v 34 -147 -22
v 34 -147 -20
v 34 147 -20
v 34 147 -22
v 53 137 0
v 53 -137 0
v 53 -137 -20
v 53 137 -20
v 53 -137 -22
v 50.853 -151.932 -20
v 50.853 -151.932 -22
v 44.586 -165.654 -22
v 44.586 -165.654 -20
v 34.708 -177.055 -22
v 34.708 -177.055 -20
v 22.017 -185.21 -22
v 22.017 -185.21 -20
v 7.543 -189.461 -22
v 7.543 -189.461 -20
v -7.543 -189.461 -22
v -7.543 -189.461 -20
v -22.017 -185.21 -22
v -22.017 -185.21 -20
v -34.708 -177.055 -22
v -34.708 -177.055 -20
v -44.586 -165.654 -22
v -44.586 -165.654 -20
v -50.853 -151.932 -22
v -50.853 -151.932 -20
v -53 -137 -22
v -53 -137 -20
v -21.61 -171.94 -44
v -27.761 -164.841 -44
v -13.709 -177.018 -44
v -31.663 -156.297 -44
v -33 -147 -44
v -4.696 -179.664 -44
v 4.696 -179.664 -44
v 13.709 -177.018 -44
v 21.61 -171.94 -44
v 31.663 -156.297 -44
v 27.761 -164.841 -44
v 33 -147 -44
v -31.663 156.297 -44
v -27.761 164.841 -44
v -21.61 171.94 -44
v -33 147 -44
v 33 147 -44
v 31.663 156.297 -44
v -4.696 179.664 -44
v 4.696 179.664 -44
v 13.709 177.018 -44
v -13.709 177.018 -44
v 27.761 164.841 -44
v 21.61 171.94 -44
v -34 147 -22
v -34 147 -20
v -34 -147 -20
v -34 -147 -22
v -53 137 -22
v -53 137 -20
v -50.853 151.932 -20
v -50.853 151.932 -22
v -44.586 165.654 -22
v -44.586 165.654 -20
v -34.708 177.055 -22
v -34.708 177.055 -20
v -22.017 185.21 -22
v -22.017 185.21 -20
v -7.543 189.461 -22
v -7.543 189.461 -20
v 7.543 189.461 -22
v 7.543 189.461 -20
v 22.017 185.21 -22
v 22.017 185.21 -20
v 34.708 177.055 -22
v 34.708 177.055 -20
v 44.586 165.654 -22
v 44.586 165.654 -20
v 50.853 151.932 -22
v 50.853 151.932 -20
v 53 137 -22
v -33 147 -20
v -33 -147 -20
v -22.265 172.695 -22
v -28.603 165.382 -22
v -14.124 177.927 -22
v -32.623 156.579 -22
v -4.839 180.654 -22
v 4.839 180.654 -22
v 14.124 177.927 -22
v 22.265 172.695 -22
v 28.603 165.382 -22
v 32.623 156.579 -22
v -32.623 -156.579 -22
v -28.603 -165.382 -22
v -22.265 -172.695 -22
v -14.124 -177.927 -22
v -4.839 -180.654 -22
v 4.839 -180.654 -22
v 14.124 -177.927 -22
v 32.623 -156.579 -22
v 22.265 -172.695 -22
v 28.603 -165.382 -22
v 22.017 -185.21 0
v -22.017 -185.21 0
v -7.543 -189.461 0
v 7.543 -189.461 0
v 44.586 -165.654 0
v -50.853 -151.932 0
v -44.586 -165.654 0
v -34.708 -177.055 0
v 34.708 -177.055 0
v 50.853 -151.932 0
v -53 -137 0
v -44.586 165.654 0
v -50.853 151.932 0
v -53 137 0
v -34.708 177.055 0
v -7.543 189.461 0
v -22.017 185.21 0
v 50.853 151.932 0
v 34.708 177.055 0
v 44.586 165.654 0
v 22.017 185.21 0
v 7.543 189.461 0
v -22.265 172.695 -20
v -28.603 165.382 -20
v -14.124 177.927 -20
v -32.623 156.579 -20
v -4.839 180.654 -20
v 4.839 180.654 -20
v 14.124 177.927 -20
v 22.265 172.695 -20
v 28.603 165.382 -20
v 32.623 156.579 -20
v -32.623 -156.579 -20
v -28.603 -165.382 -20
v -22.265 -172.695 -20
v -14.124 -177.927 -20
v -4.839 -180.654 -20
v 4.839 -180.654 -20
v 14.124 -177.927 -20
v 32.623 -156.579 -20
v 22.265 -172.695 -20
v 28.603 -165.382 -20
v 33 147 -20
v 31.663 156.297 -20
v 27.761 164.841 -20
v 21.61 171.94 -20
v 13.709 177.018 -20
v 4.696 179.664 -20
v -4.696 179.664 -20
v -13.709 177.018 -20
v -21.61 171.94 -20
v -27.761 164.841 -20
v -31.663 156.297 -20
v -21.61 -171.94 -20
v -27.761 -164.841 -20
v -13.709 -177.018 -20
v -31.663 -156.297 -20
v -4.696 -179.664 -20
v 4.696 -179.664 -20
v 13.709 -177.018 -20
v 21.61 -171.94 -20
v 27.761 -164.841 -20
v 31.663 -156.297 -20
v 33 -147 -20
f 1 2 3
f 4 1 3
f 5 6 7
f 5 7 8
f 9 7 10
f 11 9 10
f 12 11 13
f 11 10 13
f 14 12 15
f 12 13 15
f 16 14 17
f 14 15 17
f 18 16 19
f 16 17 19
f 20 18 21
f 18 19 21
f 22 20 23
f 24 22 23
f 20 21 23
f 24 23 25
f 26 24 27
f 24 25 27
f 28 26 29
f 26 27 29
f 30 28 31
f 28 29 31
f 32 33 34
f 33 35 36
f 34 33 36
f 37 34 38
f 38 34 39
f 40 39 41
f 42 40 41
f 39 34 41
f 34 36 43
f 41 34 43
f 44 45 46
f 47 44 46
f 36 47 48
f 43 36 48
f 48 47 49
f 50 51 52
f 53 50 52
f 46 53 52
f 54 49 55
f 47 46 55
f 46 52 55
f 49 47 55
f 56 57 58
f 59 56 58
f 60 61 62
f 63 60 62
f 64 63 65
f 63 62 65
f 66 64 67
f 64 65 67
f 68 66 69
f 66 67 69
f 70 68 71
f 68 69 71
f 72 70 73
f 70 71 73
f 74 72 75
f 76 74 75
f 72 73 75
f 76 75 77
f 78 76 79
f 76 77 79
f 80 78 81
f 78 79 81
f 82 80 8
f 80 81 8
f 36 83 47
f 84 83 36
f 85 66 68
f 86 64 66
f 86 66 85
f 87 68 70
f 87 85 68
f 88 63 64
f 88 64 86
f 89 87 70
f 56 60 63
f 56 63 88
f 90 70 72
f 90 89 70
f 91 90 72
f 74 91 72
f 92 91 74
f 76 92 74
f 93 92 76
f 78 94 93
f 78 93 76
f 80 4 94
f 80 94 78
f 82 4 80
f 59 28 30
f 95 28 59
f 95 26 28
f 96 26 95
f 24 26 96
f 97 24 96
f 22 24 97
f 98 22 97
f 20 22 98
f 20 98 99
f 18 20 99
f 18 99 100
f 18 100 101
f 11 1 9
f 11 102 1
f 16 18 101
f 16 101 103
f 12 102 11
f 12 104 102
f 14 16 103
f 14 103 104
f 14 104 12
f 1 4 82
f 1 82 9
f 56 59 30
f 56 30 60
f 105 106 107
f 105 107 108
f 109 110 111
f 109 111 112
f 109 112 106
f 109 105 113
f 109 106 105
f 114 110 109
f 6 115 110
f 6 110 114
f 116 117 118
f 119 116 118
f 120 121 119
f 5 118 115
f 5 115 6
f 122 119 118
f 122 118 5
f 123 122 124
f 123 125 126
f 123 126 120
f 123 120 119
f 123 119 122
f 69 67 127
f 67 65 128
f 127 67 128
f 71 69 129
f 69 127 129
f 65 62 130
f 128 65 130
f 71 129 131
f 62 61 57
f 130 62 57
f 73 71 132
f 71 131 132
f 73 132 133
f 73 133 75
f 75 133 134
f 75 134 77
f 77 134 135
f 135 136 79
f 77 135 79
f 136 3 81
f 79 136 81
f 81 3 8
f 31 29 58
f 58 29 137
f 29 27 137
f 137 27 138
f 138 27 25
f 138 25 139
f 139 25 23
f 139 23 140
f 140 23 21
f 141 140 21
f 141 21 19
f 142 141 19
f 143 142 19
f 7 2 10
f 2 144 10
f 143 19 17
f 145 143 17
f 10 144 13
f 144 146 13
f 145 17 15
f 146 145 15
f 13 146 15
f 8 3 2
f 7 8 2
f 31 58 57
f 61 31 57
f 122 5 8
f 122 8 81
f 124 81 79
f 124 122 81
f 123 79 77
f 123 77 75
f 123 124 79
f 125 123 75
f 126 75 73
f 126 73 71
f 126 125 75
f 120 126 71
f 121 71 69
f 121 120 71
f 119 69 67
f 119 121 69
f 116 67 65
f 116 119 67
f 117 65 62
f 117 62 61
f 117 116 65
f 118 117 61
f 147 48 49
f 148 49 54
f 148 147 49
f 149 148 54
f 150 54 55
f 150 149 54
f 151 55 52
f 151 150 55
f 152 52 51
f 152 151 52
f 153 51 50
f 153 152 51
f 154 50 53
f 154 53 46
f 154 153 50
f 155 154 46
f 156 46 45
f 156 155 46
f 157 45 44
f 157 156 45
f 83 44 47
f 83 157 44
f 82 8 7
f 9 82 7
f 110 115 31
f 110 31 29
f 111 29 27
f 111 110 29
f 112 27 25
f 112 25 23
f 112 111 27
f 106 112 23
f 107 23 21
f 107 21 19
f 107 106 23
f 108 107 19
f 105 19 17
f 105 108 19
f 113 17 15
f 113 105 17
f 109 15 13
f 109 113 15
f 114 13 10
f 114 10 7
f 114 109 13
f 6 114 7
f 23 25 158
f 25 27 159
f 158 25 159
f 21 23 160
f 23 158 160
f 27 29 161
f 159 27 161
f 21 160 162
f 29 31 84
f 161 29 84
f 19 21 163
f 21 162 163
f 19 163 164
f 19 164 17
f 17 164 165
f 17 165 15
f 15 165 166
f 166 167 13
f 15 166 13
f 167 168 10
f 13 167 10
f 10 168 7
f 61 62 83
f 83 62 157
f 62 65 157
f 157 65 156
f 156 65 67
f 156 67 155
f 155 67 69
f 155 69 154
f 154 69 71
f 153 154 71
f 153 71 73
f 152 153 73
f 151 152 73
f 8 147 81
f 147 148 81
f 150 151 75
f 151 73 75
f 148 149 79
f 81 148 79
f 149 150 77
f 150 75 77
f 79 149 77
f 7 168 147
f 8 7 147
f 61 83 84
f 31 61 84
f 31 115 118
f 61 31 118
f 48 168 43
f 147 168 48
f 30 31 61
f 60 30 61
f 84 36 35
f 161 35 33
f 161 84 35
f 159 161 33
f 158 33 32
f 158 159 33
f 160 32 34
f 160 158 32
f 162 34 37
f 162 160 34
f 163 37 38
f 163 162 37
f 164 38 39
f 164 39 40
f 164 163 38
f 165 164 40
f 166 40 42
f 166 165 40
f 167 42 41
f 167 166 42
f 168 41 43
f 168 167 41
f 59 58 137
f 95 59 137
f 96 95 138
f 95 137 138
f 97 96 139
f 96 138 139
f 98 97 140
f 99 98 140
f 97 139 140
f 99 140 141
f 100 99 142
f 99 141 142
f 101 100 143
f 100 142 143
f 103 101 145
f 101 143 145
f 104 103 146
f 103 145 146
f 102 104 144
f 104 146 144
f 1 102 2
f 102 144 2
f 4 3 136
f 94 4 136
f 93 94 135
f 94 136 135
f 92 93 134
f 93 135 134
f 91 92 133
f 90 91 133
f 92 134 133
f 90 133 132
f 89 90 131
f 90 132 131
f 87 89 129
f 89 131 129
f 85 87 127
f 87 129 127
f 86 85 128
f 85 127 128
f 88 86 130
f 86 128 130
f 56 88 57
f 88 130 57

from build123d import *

# Parameters (mm, degrees)
F0_W     = 66
F0_H     = 274
F0_H_2   = 10
F1_DEPTH = 44
F0_W_2   = 20
F2_DEPTH = 20
F4_DEPTH = 2


with BuildPart() as f1:
    # F0 (on Top) → F1 (new body)
    with BuildSketch(Plane.XY):
        Rectangle(F0_W, F0_H)
        with Locations((0, 142)):
            Rectangle(F0_W, F0_H_2)
        with BuildLine():
            Line((-33, 147), (33, 147))
            ThreePointArc((33, 147), (0, 180), (-33, 147))
        make_face()
        with Locations((0, -142)):
            Rectangle(F0_W, F0_H_2)
        with BuildLine():
            ThreePointArc((-33, -147), (0, -180), (33, -147))
            Line((33, -147), (-33, -147))
        make_face()
    extrude(amount=-F1_DEPTH)

    # F0 (on Top) → F2 (join)
    with BuildSketch(Plane.XY):
        with Locations((-43, 0)):
            Rectangle(F0_W_2, F0_H)
        with BuildLine():
            ThreePointArc((-33, 147), (0, 180), (33, 147))
            Line((33, 147), (33, 137))
            Line((33, 137), (53, 137))
            ThreePointArc((53, 137), (0, 190), (-53, 137))
            Line((-53, 137), (-33, 137))
            Line((-33, 137), (-33, 147))
        make_face()
        with Locations((43, 0)):
            Rectangle(F0_W_2, F0_H)
        with BuildLine():
            Line((53, -137), (33, -137))
            Line((33, -137), (33, -147))
            ThreePointArc((33, -147), (0, -180), (-33, -147))
            Line((-33, -147), (-33, -137))
            Line((-33, -137), (-53, -137))
            ThreePointArc((-53, -137), (0, -190), (53, -137))
        make_face()
    extrude(amount=-F2_DEPTH)


with BuildPart() as f4:
    # F3 (on face) → F4 (new body)
    with BuildSketch(Plane(origin=(0, 0, -20), x_dir=(1, 0, 0), z_dir=(0, 0, -1))):
        with BuildLine():
            ThreePointArc((53, 137), (0, 190), (-53, 137))
            Line((-53, 137), (-53, -137))
            ThreePointArc((-53, -137), (0, -190), (53, -137))
            Line((53, -137), (53, 137))
        make_face()
        with BuildLine():
            ThreePointArc((34, -147), (0, -181), (-34, -147))
            Line((-34, -147), (-34, 147))
            ThreePointArc((-34, 147), (0, 181), (34, 147))
            Line((34, 147), (34, -147))
        make_face(mode=Mode.SUBTRACT)
    extrude(amount=F4_DEPTH)


solid = Compound([f1.part, f4.part])
